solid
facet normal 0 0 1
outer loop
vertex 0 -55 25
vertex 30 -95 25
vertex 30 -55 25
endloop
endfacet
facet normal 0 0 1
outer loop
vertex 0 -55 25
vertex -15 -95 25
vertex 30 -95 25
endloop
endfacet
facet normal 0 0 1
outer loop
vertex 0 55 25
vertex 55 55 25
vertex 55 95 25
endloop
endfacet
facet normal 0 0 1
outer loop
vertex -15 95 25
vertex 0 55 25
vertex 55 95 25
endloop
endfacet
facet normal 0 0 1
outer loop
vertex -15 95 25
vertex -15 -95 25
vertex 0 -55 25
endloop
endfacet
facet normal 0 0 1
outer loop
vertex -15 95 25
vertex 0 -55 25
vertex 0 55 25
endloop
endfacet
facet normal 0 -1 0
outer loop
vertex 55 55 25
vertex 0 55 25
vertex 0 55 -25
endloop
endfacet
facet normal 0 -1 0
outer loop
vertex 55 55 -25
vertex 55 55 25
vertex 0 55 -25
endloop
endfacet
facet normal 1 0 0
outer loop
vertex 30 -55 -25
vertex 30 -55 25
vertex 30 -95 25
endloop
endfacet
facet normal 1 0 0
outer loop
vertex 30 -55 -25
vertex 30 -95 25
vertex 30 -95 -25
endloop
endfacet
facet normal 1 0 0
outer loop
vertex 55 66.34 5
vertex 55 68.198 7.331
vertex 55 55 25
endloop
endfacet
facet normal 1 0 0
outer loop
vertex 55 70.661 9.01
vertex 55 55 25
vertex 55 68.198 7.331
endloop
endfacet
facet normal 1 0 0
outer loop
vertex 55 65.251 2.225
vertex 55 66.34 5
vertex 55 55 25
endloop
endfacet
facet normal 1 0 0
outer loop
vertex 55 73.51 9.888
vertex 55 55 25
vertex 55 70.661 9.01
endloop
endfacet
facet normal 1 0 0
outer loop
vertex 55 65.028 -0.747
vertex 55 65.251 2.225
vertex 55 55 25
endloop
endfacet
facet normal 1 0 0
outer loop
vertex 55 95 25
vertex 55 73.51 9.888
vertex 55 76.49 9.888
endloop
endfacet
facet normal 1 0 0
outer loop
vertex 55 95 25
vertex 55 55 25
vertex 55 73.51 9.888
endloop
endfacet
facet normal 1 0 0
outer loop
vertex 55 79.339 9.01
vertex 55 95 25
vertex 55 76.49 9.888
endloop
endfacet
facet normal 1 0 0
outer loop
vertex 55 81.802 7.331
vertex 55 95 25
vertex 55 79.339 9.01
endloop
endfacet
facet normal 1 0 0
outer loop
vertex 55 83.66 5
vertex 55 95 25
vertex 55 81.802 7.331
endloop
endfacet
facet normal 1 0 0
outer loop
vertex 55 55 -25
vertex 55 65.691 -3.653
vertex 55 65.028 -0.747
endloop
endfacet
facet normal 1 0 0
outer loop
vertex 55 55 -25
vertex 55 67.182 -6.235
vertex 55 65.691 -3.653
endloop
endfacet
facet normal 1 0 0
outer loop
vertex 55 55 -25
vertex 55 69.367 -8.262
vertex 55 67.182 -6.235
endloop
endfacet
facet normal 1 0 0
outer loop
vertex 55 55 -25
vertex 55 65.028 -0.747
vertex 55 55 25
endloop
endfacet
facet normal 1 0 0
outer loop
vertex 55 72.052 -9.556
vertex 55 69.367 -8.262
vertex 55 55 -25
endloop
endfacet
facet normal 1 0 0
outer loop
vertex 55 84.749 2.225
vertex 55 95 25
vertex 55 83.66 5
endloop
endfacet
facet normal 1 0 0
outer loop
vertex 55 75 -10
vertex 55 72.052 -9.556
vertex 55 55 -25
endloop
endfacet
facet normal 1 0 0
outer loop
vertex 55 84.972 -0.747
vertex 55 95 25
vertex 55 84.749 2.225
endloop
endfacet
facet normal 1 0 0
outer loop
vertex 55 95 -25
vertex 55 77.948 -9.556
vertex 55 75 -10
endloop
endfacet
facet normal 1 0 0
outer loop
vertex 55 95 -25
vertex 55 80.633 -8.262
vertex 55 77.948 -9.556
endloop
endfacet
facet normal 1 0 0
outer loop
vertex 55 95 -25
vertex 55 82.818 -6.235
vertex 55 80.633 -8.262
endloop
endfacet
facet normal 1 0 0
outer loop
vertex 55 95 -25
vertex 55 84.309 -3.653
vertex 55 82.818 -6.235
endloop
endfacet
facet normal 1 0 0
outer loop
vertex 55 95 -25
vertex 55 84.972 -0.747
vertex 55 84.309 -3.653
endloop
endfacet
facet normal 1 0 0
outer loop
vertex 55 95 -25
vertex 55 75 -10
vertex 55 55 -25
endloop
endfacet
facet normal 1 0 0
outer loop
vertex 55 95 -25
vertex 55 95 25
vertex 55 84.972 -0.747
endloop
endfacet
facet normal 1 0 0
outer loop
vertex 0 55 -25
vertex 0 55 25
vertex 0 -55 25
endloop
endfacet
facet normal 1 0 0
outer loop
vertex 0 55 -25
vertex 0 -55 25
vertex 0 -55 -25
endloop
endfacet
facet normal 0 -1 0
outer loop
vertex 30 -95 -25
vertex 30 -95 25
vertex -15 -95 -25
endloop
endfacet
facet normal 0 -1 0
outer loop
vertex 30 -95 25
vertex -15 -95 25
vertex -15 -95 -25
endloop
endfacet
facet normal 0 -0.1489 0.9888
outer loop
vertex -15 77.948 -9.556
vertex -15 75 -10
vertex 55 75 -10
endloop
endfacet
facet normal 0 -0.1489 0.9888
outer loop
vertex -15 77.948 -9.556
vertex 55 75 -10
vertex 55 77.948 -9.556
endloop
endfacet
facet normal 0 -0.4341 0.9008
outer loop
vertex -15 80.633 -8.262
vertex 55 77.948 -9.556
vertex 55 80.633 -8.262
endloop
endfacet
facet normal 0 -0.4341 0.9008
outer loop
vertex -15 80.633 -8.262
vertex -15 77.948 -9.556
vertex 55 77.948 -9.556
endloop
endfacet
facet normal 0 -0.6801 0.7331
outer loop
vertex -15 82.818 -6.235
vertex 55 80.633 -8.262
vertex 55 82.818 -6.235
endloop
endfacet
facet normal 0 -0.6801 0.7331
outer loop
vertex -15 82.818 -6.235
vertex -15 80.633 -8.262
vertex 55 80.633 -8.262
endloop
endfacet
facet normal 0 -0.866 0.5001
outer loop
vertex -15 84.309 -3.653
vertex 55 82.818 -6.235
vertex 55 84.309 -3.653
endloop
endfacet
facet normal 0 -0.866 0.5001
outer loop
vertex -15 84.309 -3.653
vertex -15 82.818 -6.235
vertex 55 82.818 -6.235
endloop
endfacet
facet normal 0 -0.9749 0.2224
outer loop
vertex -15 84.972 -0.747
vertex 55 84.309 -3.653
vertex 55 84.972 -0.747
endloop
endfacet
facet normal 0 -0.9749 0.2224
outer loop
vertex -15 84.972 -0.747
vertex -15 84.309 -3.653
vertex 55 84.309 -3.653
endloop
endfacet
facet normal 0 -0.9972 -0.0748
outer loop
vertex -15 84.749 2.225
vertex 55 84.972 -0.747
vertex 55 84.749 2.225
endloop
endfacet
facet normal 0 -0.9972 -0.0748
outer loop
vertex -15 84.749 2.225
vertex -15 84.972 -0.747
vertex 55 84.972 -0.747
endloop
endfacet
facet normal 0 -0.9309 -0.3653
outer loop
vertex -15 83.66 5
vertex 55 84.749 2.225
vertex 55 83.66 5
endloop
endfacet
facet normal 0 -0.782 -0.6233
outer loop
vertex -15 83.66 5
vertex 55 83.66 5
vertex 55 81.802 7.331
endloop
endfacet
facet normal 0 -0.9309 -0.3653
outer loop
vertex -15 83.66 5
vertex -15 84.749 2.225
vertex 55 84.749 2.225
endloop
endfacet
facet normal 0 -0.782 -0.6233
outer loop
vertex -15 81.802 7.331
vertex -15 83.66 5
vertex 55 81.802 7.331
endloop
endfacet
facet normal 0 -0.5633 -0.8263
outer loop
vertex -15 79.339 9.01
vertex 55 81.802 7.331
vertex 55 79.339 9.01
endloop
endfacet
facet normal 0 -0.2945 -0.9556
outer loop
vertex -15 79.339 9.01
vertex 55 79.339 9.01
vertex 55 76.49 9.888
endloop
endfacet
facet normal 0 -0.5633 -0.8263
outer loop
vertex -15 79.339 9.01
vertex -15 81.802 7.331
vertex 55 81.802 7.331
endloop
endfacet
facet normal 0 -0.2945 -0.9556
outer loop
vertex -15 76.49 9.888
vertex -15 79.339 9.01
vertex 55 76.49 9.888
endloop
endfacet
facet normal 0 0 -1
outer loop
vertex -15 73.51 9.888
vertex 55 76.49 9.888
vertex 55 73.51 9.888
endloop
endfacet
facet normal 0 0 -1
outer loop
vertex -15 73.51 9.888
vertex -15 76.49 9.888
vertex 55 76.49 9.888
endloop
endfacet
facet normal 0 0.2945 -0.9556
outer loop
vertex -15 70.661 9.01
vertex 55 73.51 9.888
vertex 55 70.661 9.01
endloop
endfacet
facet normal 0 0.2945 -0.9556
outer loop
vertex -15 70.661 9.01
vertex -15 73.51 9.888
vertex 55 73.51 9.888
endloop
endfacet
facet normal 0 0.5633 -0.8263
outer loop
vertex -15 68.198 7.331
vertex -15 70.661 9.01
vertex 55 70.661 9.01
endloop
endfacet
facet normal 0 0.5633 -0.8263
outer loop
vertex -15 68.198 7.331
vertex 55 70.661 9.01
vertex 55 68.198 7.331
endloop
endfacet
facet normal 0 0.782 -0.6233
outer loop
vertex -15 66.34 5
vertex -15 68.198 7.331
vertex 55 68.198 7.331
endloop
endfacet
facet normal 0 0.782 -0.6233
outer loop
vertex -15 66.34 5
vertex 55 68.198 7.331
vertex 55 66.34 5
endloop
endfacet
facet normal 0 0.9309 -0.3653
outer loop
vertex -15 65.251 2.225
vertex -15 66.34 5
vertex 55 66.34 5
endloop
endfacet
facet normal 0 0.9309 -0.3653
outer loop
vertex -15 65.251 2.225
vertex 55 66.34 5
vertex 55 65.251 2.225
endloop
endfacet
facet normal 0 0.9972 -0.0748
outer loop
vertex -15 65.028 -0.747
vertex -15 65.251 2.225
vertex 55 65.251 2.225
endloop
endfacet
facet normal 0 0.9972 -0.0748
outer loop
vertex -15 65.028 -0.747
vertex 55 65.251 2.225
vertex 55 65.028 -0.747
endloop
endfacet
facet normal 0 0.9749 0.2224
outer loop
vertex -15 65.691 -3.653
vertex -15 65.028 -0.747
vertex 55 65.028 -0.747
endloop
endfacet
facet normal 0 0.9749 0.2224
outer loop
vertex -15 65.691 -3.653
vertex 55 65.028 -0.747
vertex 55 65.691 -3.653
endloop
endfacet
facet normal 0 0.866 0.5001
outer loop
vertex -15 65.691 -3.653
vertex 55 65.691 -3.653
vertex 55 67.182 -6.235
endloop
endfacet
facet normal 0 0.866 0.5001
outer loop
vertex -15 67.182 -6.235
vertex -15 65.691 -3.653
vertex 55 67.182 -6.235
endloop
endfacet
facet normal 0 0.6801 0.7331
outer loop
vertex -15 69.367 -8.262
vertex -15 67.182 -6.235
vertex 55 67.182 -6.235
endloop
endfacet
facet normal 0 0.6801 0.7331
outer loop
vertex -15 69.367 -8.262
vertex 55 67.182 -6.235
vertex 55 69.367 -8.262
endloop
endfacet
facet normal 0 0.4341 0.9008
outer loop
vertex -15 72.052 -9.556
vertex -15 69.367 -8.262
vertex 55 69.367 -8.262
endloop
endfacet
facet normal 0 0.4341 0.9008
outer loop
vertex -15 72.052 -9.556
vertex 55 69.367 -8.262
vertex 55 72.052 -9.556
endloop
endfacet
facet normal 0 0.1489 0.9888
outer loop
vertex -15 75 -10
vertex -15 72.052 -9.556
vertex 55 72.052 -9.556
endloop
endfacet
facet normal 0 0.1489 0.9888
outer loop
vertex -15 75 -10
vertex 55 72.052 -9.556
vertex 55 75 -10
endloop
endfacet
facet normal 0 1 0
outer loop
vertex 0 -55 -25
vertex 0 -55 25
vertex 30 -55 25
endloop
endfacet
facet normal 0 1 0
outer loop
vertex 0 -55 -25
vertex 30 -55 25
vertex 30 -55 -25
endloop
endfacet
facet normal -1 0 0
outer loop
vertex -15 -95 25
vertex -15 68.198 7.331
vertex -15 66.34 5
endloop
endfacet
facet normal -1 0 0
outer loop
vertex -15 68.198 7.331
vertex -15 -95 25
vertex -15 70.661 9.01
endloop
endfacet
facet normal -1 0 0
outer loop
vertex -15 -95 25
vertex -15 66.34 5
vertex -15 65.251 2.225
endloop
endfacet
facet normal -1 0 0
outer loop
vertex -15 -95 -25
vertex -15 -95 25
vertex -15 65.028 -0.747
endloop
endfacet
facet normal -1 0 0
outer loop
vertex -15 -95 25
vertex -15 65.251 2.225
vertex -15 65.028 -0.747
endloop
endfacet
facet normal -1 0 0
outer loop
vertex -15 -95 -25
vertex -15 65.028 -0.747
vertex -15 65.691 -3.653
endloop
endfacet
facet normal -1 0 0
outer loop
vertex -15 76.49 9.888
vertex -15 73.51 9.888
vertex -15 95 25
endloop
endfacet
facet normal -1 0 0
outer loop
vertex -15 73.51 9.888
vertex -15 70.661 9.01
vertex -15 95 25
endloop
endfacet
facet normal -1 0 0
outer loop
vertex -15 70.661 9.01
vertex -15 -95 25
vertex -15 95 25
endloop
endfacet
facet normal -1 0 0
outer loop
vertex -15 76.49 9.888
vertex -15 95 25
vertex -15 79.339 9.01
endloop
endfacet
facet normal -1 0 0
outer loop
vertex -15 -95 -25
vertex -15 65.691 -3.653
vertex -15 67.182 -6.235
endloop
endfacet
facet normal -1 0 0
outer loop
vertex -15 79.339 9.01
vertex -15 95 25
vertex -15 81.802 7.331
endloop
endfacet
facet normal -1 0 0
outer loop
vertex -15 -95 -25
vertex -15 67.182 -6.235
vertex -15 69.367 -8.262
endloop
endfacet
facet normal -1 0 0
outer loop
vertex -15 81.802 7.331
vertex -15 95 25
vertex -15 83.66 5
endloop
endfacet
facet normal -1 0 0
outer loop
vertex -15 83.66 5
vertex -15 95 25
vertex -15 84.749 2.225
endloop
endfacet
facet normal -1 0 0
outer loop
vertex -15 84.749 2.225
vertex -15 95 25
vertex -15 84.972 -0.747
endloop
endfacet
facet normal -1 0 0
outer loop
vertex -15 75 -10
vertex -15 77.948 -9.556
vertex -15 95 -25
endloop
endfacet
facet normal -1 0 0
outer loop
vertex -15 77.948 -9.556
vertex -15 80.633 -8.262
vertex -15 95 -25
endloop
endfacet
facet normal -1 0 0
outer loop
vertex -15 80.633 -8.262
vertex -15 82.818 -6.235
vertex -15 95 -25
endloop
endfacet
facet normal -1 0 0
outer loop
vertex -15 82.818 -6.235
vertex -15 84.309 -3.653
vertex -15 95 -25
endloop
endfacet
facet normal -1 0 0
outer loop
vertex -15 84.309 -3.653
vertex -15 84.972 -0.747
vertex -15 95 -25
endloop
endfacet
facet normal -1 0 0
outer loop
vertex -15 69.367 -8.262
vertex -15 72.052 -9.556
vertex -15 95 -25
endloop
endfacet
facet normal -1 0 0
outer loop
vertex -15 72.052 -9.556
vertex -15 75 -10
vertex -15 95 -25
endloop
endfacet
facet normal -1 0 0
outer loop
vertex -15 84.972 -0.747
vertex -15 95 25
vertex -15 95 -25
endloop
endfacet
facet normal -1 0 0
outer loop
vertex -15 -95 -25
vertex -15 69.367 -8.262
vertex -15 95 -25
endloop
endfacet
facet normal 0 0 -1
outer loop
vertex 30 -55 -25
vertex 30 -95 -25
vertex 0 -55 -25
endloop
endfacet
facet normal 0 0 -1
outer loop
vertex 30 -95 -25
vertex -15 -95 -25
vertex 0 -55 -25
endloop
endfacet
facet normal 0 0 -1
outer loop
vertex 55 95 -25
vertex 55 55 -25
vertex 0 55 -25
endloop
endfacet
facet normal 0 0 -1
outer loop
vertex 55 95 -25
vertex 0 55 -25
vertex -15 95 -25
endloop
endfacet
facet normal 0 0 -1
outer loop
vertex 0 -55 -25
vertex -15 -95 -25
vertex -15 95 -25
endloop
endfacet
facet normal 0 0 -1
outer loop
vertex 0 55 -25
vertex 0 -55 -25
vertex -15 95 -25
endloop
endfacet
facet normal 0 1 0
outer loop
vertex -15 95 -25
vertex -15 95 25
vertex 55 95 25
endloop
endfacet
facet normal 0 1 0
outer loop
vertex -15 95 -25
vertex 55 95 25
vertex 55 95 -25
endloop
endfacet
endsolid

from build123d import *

# Parameters (mm, degrees)
SKETCH1_W           = 50
SKETCH1_H           = 40
SKETCH1_R           = 10
BOSS_EXTRUDE1_DEPTH = 55
BOSS_EXTRUDE2_START = -15
SKETCH1_3_W         = 50
SKETCH1_3_H         = 190
SKETCH1_3_R         = 10
BOSS_EXTRUDE2_DEPTH = 15
SKETCH1_4_W         = 50
SKETCH1_4_H         = 40
BOSS_EXTRUDE3_DEPTH = 30


with BuildPart() as part:
    # Sketch1 → Boss-Extrude1 (new body)
    with BuildSketch(Plane(origin=(0, 0, 0), x_dir=(0, 0, -1), z_dir=(1, 0, 0))):
        with Locations((0, 75)):
            Rectangle(SKETCH1_W, SKETCH1_H)
        with Locations((0, 75)):
            Circle(SKETCH1_R, mode=Mode.SUBTRACT)
    extrude(amount=BOSS_EXTRUDE1_DEPTH)

    # Sketch1<3> → Boss-Extrude2 (add)
    with BuildSketch(Plane(origin=(0, 0, 0), x_dir=(0, 0, -1), z_dir=(1, 0, 0)).offset(BOSS_EXTRUDE2_START)):
        Rectangle(SKETCH1_3_W, SKETCH1_3_H)
        with Locations((0, 75)):
            Circle(SKETCH1_3_R, mode=Mode.SUBTRACT)
    extrude(amount=BOSS_EXTRUDE2_DEPTH)

    # Sketch1<4> → Boss-Extrude3 (add)
    with BuildSketch(Plane(origin=(0, 0, 0), x_dir=(0, 0, -1), z_dir=(1, 0, 0))):
        with Locations((0, -75)):
            Rectangle(SKETCH1_4_W, SKETCH1_4_H)
    extrude(amount=BOSS_EXTRUDE3_DEPTH)


solid = part.part
